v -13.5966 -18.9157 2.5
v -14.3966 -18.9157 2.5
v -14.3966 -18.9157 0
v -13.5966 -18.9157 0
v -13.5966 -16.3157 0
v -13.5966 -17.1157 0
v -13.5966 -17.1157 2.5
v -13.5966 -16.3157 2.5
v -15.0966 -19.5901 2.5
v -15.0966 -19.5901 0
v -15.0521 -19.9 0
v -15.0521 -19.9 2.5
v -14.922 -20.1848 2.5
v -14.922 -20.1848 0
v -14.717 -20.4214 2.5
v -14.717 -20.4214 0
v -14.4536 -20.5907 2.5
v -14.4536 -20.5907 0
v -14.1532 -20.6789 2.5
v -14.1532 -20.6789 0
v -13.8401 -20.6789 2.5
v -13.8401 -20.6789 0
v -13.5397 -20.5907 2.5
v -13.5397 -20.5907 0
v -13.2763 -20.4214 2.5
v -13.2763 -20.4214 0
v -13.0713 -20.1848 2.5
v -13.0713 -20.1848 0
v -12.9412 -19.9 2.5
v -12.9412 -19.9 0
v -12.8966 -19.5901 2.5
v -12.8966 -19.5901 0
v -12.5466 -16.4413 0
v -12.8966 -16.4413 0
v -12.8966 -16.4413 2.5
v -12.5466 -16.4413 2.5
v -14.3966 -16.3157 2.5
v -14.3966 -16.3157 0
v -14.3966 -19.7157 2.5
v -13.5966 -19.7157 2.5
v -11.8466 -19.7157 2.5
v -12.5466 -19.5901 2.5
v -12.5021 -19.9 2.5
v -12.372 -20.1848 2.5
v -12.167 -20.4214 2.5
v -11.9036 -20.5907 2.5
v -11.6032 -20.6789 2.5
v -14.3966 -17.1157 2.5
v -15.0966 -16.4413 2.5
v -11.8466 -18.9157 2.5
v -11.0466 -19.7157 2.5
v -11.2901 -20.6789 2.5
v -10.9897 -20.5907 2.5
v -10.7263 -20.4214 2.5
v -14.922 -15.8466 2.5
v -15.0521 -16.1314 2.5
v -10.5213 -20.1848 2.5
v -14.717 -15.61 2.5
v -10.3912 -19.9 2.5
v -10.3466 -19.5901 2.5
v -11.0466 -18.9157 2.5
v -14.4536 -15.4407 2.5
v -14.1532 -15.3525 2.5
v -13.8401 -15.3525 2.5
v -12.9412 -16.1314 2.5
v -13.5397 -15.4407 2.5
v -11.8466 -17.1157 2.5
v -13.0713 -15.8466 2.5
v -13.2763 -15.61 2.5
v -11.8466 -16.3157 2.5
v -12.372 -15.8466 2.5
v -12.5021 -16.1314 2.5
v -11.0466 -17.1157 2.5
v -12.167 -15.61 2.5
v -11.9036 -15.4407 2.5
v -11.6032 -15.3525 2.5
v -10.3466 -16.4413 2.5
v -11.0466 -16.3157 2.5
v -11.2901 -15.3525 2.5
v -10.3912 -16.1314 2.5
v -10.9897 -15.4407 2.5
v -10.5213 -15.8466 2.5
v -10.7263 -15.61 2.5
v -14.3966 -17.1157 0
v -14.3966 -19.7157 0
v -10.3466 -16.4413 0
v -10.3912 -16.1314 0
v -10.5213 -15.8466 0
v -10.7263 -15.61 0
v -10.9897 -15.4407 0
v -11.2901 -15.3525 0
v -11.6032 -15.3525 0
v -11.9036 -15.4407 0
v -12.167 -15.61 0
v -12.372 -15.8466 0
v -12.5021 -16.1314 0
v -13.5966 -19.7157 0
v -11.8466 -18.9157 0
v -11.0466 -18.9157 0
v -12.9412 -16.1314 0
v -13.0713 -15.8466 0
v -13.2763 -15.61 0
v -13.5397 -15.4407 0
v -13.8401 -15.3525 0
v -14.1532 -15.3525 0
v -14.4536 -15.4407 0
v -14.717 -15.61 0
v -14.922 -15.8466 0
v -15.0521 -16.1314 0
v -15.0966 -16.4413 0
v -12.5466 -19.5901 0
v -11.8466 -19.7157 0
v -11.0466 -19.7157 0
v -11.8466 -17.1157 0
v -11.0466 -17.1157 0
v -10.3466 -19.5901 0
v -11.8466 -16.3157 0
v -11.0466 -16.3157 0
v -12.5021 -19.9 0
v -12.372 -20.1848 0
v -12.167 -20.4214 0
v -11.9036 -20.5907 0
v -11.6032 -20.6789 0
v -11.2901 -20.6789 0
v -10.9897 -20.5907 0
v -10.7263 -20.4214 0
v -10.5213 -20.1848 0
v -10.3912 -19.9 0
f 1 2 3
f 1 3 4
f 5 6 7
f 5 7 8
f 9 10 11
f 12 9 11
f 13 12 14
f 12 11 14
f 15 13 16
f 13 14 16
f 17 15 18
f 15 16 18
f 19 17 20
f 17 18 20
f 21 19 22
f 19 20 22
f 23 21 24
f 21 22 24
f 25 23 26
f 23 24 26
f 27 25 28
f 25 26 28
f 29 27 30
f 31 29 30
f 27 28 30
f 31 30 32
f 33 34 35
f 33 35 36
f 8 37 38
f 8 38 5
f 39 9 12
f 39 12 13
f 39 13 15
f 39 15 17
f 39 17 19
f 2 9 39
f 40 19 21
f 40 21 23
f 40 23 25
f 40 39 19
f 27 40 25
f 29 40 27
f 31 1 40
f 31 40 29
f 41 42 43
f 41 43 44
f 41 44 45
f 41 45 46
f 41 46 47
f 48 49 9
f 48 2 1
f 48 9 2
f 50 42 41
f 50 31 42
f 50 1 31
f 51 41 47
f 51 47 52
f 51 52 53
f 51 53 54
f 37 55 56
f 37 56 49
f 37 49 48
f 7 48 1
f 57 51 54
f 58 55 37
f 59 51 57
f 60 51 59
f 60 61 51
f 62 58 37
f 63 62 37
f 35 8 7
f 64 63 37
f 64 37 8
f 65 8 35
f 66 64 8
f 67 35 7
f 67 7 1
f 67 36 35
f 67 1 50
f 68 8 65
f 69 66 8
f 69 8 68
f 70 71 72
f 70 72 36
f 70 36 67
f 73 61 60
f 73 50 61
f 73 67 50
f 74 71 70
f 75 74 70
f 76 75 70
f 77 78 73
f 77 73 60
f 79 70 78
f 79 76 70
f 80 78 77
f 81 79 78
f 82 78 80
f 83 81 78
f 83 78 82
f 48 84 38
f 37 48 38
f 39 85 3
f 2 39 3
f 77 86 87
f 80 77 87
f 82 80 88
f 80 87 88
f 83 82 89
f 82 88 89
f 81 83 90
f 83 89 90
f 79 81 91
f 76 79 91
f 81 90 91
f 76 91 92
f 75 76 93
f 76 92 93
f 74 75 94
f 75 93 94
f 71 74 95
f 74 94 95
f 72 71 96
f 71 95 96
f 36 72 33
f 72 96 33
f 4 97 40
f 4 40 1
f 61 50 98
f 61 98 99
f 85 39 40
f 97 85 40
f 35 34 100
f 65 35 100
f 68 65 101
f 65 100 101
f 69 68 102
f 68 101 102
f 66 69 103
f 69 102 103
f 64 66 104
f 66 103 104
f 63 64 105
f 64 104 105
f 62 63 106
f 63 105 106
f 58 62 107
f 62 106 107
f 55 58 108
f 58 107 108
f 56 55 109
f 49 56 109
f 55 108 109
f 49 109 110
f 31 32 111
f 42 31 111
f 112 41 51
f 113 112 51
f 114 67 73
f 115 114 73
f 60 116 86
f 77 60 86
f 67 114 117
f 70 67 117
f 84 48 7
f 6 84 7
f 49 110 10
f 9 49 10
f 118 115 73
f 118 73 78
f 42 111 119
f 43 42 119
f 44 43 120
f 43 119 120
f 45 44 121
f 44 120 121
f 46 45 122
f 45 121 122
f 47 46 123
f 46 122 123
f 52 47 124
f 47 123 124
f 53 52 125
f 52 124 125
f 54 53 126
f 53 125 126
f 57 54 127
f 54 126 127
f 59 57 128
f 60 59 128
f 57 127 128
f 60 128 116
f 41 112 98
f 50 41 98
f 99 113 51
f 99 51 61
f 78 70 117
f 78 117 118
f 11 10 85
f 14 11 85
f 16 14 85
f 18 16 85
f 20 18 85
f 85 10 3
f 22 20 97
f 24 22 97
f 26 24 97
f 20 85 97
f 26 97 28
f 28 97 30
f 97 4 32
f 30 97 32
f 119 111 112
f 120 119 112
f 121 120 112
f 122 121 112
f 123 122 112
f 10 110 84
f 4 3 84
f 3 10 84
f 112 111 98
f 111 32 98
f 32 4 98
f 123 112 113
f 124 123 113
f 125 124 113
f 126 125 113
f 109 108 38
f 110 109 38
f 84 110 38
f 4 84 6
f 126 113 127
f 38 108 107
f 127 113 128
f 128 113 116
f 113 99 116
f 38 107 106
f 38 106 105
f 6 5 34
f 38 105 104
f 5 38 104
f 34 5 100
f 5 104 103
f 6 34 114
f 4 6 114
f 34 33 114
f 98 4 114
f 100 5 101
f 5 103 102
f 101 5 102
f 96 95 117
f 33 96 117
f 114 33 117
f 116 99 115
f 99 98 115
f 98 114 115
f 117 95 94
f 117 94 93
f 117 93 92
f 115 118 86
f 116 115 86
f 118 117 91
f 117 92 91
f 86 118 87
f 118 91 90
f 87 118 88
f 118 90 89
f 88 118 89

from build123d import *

# Parameters (mm, degrees)
SKICA1_W                 = 0.35
SKICA1_H                 = 3.148765599
P_IDAT_VYSUNUT_M1_DEPTH  = 2.5
SKICA2_W                 = 0.8
SKICA2_H                 = 0.8
ODEBRAT_VYSUNUT_M1_DEPTH = 2.5


with BuildPart() as part:
    # Skica1 → Přidat vysunutím1 (new body)
    with BuildSketch(Plane.XY):
        with BuildLine():
            Line((-12.89663996, -19.590083306), (-12.89663996, -16.441317707))
            ThreePointArc((-12.89663996, -16.441317707), (-13.99663996, -15.341317707), (-15.09663996, -16.441317707))
            Line((-15.09663996, -16.441317707), (-15.09663996, -19.590083306))
            ThreePointArc((-15.09663996, -19.590083306), (-13.99663996, -20.690083306), (-12.89663996, -19.590083306))
        make_face()
        with Locations((-12.72163996, -18.015700506)):
            Rectangle(SKICA1_W, SKICA1_H)
        with BuildLine():
            Line((-10.34663996, -19.590083306), (-10.34663996, -16.441317707))
            ThreePointArc((-10.34663996, -16.441317707), (-11.44663996, -15.341317707), (-12.54663996, -16.441317707))
            Line((-12.54663996, -16.441317707), (-12.54663996, -19.590083306))
            ThreePointArc((-12.54663996, -19.590083306), (-11.44663996, -20.690083306), (-10.34663996, -19.590083306))
        make_face()
    extrude(amount=P_IDAT_VYSUNUT_M1_DEPTH)

    # Skica2 → Odebrat vysunutím1 (cut)
    with BuildSketch(Plane.XY.offset(2.5)):
        with Locations((-13.99663996, -16.715700507)):
            Rectangle(SKICA2_W, SKICA2_H)
        with Locations((-13.99663996, -19.315700507)):
            Rectangle(SKICA2_W, SKICA2_H)
        with Locations((-11.44663996, -16.715700507)):
            Rectangle(SKICA2_W, SKICA2_H)
        with Locations((-11.44663996, -19.315700507)):
            Rectangle(SKICA2_W, SKICA2_H)
    extrude(amount=-ODEBRAT_VYSUNUT_M1_DEPTH, mode=Mode.SUBTRACT)


solid = part.part
